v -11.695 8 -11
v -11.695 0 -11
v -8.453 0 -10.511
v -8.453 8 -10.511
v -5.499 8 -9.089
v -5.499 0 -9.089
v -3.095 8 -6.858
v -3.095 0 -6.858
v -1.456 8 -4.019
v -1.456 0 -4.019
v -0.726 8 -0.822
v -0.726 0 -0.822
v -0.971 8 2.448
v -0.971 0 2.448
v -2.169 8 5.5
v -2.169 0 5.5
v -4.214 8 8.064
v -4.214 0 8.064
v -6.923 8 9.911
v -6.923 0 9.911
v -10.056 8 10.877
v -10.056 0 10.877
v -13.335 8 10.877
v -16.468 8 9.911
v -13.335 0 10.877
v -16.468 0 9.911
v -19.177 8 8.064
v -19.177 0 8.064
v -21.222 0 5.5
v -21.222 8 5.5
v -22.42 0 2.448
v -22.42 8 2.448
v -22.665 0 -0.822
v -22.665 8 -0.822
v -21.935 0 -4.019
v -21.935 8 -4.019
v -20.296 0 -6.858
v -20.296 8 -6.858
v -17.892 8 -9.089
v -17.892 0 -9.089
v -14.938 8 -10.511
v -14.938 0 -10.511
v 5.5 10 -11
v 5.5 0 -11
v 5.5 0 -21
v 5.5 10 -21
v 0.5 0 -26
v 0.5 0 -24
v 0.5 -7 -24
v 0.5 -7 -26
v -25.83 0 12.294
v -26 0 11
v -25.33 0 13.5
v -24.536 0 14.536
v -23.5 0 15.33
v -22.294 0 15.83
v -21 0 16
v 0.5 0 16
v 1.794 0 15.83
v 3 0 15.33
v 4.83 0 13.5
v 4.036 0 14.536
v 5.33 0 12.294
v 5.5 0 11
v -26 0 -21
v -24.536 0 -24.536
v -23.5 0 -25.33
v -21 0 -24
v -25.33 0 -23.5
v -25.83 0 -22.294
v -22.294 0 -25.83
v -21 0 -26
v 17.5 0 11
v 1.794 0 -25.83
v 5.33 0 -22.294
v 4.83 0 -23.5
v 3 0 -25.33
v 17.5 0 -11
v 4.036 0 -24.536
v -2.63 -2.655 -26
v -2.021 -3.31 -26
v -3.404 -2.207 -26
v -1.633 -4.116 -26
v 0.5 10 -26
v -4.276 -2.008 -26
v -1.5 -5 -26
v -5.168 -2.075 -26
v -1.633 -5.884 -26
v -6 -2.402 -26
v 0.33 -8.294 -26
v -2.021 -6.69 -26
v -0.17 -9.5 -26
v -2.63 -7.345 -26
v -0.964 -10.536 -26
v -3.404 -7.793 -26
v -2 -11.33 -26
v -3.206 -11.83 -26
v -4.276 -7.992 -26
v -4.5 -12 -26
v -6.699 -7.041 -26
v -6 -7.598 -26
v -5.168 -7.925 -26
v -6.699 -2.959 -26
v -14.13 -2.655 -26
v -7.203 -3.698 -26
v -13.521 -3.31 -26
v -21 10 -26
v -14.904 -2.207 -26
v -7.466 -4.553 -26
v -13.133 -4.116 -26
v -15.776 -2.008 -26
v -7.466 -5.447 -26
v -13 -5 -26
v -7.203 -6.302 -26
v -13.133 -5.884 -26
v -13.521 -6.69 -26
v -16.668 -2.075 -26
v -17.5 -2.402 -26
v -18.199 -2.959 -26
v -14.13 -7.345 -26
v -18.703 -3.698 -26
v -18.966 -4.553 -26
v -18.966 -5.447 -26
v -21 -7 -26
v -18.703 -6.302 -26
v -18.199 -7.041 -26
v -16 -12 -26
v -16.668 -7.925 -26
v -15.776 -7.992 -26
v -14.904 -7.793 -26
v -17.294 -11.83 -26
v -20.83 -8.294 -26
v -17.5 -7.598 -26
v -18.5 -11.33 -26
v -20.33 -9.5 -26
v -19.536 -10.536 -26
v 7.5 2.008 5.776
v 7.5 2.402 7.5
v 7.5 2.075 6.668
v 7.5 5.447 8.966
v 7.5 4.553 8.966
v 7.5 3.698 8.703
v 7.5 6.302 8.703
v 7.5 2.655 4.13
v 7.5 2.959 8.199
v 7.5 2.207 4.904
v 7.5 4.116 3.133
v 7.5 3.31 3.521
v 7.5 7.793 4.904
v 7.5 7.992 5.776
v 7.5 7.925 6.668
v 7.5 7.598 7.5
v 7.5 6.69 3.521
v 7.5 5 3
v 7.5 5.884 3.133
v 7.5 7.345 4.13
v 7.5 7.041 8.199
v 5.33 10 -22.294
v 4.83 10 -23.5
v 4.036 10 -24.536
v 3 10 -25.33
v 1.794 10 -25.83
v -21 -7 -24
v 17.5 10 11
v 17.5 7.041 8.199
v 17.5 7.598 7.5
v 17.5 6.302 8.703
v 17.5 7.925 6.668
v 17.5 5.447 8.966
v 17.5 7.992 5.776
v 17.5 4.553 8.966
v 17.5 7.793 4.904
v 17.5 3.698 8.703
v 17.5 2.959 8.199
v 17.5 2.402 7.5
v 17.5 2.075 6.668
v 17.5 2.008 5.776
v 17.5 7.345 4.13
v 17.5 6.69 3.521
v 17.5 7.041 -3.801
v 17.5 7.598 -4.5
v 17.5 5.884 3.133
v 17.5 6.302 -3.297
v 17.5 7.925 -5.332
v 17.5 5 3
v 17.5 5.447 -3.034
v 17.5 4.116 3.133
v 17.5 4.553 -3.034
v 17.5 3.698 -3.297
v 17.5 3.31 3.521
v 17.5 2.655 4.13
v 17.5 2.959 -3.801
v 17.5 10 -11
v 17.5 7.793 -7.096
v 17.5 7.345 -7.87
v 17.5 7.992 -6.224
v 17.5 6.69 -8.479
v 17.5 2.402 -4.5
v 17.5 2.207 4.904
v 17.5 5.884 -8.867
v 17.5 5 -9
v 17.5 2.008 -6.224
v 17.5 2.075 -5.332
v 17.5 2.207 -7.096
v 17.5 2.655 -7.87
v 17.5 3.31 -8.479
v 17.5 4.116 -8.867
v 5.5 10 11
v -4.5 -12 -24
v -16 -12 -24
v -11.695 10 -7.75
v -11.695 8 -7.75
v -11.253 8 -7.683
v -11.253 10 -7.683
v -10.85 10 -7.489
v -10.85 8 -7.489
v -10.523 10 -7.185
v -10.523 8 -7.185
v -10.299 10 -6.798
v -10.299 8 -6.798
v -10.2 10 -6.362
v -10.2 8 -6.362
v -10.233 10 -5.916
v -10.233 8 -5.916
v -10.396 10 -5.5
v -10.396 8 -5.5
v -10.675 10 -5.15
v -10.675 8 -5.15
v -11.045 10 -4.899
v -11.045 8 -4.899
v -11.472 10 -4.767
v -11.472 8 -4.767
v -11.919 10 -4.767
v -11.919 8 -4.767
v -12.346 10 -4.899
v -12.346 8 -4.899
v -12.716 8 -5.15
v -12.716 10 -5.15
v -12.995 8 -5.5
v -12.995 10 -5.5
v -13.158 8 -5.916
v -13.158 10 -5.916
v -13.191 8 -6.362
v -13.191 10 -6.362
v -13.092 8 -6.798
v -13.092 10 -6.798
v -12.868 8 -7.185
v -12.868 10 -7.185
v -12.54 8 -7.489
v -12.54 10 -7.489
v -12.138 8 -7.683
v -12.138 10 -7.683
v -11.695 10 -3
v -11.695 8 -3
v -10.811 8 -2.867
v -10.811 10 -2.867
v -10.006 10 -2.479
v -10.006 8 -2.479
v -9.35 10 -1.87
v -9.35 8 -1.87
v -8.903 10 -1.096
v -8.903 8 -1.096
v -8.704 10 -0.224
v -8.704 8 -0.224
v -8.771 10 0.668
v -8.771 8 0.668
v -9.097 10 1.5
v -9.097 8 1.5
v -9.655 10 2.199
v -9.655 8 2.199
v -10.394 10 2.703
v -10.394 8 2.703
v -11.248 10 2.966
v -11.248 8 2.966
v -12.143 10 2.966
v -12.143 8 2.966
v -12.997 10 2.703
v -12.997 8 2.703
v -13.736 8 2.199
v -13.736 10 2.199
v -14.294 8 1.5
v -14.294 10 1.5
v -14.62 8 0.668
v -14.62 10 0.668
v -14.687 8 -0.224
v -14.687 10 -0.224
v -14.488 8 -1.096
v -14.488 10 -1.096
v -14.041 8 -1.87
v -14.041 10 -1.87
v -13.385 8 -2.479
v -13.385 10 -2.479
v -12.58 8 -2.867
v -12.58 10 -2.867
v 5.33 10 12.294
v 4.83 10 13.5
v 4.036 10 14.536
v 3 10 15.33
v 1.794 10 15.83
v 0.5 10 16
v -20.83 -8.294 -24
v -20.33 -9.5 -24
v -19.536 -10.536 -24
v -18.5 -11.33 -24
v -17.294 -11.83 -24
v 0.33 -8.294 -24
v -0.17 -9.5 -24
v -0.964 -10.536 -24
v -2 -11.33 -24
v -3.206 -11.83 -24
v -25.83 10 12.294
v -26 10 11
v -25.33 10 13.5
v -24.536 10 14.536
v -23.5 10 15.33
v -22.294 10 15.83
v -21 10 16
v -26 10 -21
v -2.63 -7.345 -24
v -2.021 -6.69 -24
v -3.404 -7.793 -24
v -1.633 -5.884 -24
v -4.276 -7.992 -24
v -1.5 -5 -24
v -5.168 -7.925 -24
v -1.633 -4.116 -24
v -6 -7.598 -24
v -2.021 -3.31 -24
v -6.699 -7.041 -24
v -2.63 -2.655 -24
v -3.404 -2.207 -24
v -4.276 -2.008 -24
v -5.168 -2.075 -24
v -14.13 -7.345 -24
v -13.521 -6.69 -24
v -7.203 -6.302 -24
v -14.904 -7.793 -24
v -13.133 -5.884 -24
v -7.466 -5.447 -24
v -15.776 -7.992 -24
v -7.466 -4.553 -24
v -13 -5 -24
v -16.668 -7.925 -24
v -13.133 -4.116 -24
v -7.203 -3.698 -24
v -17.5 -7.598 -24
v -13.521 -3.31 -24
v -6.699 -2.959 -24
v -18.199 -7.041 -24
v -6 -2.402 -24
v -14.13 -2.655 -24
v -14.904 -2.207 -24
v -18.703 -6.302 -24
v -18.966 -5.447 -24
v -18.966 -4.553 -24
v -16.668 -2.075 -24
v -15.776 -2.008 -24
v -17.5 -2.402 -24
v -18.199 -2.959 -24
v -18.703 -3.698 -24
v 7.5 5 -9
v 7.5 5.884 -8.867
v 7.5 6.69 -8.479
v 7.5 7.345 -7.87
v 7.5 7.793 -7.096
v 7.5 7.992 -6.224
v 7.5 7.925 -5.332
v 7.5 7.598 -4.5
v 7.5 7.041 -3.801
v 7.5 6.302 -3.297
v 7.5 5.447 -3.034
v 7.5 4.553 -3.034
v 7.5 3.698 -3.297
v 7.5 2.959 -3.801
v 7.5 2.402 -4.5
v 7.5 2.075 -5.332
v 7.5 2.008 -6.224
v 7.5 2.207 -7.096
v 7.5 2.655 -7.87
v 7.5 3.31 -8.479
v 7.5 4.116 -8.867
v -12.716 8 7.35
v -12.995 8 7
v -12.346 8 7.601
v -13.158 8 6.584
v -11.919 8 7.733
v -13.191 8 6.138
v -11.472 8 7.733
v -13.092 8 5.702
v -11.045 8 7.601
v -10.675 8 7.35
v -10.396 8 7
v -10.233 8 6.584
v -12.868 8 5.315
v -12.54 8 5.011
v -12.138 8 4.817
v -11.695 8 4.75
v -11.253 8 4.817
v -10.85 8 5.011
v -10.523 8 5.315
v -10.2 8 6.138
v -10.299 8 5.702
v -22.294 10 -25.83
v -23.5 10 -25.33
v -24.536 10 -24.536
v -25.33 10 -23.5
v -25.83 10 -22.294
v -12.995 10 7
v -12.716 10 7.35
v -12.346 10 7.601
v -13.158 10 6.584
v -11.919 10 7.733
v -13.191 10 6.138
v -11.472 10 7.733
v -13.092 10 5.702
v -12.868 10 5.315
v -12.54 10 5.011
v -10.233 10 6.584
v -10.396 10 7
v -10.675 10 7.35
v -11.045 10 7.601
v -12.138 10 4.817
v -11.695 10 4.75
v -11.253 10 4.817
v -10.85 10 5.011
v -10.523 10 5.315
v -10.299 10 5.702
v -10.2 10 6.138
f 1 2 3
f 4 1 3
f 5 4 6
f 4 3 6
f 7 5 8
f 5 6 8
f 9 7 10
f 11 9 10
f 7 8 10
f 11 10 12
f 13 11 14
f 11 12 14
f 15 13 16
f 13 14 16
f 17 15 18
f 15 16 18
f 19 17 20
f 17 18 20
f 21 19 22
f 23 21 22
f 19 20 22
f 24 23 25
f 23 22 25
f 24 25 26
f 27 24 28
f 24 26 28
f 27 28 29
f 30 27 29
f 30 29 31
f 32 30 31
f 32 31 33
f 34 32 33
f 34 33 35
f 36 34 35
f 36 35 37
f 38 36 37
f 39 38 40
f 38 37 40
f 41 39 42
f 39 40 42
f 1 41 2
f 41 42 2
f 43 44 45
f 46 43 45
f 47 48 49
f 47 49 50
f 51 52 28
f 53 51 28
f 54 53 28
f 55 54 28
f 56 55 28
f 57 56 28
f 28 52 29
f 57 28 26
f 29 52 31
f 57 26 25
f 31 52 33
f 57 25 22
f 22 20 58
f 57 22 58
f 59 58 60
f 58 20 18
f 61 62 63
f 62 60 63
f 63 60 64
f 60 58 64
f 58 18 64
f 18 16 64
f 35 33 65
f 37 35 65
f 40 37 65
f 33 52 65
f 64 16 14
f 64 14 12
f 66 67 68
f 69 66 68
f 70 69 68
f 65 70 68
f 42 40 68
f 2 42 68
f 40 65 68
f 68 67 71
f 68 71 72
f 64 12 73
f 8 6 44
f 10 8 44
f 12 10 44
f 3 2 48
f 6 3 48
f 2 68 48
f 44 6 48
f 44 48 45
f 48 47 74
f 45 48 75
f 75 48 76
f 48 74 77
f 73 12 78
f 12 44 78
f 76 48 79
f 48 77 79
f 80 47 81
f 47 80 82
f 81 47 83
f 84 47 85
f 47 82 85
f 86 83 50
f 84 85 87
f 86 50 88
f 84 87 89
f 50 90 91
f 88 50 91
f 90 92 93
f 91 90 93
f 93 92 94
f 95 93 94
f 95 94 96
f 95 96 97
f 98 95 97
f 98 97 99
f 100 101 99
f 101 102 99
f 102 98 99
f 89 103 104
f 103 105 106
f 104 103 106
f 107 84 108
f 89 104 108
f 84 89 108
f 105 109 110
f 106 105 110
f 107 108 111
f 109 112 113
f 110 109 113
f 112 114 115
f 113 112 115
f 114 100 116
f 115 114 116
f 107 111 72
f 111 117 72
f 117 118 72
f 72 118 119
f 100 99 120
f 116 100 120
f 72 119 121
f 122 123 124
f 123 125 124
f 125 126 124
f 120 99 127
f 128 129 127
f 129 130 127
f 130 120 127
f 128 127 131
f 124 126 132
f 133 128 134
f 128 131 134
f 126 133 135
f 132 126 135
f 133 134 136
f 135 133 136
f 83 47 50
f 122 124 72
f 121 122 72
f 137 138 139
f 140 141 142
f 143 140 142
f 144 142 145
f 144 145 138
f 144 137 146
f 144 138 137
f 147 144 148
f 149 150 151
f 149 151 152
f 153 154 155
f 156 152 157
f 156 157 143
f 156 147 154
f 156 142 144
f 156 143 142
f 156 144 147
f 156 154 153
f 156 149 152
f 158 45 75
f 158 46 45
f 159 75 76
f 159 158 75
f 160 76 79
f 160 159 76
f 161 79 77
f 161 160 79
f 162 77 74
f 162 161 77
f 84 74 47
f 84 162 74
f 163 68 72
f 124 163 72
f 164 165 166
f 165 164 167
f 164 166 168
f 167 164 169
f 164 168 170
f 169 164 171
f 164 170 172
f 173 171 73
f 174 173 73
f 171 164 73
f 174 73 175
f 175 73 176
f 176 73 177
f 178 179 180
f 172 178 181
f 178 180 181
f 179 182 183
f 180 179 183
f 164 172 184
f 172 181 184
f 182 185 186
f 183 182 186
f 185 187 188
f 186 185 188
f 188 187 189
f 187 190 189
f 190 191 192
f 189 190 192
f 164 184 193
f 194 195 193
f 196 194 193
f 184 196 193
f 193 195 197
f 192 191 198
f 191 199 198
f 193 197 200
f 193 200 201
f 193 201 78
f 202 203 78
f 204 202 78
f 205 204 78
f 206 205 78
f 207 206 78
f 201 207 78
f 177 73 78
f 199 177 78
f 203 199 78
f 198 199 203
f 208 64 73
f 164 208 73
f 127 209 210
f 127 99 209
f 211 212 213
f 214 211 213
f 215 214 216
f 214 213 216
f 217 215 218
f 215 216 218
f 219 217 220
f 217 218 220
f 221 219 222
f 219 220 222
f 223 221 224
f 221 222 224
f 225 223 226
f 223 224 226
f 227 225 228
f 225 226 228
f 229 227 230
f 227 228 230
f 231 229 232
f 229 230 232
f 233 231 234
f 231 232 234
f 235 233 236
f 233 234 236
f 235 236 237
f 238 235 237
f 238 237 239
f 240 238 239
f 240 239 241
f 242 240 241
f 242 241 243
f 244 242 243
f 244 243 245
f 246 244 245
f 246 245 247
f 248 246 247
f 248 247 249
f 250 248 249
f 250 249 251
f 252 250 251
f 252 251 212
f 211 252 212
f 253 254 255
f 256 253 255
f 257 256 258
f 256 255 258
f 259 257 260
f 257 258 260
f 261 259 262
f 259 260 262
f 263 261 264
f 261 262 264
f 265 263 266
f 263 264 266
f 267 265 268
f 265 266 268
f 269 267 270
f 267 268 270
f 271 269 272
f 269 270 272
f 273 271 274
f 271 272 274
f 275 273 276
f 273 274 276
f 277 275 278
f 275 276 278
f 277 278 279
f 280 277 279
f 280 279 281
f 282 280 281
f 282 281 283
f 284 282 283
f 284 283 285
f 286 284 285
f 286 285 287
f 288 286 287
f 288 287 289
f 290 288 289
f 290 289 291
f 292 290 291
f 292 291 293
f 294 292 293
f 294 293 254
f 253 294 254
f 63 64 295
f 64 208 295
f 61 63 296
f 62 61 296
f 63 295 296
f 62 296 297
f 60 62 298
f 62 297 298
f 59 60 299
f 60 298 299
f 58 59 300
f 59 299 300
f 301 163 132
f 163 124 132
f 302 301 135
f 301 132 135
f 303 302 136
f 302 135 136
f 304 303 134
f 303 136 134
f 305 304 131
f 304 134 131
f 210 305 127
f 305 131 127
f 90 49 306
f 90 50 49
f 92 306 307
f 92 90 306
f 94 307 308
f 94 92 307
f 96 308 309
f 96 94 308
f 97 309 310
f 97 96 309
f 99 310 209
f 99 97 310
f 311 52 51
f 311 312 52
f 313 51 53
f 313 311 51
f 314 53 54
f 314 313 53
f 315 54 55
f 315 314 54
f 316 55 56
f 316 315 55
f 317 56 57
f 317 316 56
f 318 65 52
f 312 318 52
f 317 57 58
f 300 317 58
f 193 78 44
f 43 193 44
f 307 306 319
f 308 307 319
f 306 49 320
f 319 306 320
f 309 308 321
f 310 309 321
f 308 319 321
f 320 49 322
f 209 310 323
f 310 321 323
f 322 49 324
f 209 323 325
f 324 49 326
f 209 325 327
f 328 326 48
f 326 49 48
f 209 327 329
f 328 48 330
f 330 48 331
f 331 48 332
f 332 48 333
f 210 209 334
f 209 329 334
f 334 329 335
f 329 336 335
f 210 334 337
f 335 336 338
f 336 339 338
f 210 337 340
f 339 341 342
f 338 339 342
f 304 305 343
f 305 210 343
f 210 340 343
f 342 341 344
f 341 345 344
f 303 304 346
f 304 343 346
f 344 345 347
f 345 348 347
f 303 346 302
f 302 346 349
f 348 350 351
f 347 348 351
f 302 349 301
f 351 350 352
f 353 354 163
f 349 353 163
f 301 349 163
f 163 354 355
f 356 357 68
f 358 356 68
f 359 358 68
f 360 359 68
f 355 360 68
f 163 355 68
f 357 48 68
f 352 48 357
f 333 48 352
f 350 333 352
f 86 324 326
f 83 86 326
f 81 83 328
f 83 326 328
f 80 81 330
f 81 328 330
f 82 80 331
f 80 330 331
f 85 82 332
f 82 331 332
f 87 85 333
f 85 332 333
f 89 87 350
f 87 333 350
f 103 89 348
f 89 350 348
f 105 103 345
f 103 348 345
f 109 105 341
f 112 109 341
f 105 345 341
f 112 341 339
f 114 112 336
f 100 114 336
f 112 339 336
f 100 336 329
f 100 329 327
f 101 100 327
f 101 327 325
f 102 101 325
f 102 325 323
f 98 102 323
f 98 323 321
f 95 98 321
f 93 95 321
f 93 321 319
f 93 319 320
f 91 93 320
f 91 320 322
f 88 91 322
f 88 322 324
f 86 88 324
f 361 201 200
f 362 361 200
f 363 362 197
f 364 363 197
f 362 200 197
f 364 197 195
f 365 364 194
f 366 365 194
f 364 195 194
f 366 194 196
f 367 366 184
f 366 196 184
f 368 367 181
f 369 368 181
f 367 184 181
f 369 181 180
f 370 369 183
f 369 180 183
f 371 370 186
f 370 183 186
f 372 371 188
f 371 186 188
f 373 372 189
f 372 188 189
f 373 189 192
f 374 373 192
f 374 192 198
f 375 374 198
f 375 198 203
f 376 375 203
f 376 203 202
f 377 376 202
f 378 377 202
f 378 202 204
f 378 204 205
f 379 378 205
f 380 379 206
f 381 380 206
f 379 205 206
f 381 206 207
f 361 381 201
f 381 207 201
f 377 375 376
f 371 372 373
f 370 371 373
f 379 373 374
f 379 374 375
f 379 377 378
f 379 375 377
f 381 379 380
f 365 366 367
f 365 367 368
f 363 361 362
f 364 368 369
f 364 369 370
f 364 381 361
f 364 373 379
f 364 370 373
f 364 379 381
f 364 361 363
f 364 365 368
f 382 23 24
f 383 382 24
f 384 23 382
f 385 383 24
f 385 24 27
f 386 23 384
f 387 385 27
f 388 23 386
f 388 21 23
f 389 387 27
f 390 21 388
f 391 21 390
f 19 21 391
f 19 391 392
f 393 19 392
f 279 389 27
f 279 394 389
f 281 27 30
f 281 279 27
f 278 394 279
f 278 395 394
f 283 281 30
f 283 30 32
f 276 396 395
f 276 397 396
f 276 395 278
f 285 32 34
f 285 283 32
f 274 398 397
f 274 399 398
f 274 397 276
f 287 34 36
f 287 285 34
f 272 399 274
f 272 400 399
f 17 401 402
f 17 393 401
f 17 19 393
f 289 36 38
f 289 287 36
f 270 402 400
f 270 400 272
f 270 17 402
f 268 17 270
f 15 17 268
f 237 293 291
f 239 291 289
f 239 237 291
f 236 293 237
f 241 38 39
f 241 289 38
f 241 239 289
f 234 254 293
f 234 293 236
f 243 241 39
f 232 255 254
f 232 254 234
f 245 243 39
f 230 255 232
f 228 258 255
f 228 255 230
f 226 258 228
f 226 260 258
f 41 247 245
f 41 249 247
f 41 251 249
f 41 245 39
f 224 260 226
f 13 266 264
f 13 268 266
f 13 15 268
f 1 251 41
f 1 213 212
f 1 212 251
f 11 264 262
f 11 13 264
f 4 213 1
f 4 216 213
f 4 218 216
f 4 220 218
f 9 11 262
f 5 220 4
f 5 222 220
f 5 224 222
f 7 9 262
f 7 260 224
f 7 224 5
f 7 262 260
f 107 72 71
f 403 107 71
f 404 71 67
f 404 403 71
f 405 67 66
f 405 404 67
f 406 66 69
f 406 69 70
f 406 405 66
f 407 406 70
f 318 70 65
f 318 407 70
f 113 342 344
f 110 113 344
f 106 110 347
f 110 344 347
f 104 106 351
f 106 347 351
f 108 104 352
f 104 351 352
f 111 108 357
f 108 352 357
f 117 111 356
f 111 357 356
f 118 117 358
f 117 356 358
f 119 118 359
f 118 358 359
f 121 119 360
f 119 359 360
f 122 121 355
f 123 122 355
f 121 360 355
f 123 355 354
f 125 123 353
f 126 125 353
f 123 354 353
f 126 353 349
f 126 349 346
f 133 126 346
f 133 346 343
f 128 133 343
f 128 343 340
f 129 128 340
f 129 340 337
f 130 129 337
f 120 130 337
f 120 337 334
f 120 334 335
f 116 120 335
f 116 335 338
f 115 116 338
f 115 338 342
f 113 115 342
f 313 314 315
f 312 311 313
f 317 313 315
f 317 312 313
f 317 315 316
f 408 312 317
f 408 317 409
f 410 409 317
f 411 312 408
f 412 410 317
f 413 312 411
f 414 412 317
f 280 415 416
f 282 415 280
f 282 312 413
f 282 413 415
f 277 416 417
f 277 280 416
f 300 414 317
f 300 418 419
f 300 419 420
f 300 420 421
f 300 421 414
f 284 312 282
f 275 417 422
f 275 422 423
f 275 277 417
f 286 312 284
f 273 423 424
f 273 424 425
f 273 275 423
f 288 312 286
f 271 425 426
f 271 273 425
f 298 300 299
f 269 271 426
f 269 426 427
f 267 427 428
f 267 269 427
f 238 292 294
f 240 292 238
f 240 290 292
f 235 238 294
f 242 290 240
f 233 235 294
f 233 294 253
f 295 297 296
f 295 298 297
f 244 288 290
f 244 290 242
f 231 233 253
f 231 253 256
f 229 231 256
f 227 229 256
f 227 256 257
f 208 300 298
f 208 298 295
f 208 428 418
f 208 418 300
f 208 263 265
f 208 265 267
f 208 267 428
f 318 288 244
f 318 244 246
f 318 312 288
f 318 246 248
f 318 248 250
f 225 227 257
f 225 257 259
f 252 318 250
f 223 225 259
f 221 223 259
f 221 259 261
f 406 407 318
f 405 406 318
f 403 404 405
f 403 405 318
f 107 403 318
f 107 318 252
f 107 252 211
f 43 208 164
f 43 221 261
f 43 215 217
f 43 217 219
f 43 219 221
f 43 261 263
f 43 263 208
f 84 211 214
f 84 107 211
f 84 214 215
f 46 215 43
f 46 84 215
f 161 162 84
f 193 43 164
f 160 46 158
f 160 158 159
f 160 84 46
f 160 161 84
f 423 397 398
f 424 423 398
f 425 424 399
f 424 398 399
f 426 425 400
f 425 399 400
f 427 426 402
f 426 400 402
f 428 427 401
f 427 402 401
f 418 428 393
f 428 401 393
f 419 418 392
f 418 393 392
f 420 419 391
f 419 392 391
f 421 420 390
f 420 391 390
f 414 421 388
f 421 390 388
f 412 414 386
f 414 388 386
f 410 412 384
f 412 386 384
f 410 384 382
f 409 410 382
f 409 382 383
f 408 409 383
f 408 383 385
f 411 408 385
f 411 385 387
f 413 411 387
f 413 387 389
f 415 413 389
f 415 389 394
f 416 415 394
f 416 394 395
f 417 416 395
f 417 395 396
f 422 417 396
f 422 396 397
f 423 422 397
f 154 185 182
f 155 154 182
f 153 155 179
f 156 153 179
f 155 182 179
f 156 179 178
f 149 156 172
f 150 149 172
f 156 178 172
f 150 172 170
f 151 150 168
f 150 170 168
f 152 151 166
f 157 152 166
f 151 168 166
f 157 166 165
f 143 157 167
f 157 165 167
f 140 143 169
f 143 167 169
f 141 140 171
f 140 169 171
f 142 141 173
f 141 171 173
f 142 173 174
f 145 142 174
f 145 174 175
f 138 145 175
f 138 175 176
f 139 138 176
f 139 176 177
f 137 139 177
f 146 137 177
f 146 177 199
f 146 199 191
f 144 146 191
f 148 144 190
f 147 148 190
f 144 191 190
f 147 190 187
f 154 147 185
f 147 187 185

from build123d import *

# Parameters (mm, degrees)
BOSS_EXTRUDE1_DEPTH = 10
SKETCH2_R           = 3
CUT_EXTRUDE1_DEPTH  = 10
SKETCH4_R           = 11
CUT_EXTRUDE3_DEPTH  = 8
SKETCH5_R           = 3
SKETCH5_R_2         = 1.5
CUT_EXTRUDE4_DEPTH  = 8
SKETCH7_W           = 21.5
SKETCH7_H           = 2
BOSS_EXTRUDE2_DEPTH = 12
FILLET1_R           = 5
SKETCH8_R           = 3
CUT_EXTRUDE5_DEPTH  = 20
FILLET2_R           = 5


with BuildPart() as part:
    # Sketch1 → Boss-Extrude1 (new body)
    with BuildSketch(Plane(origin=(0, 0, 0), x_dir=(1, 0, 0), z_dir=(0, 1, 0))):
        Polygon((5.5, 11), (5.5, 26), (-26, 26), (-26, -16), (5.5, -16), (5.5, -11), (17.5, -11), (17.5, 11), align=None)
    extrude(amount=BOSS_EXTRUDE1_DEPTH)

    # Sketch2 → Cut-Extrude1 (cut)
    with BuildSketch(Plane(origin=(17.5, 0, 0), x_dir=(0, 0, -1), z_dir=(1, 0, 0))):
        with Locations((-6, 5)):
            Circle(SKETCH2_R)
        with Locations((6, 5)):
            Circle(SKETCH2_R)
    extrude(amount=-CUT_EXTRUDE1_DEPTH, mode=Mode.SUBTRACT)

    # Sketch4 → Cut-Extrude3 (cut)
    with BuildSketch(Plane.XZ):
        with Locations(Location((-11.695464036, 0, 0), (0, 0, 270))):
            Circle(SKETCH4_R)
    extrude(amount=-CUT_EXTRUDE3_DEPTH, mode=Mode.SUBTRACT)

    # Sketch5 → Cut-Extrude4 (cut)
    with BuildSketch(Plane(origin=(0, 8, 0), x_dir=(-1, 0, 0), z_dir=(0, -1, 0))):
        with Locations(Location((11.695464036, 0, 0), (0, 0, 90))):
            Circle(SKETCH5_R)
        with Locations(Location((11.695464036, -6.25, 0), (0, 0, 90))):
            Circle(SKETCH5_R_2)
        with Locations(Location((11.695464036, 6.25, 0), (0, 0, 90))):
            Circle(SKETCH5_R_2)
    extrude(amount=-CUT_EXTRUDE4_DEPTH, mode=Mode.SUBTRACT)

    # Sketch7 → Boss-Extrude2 (add)
    with BuildSketch(Plane(origin=(0, 0, 0), x_dir=(-1, 0, 0), z_dir=(0, -1, 0))):
        with Locations((10.25, 25)):
            Rectangle(SKETCH7_W, SKETCH7_H)
    extrude(amount=BOSS_EXTRUDE2_DEPTH)

    # Fillet1
    fillet1_edges = [part.edges().sort_by_distance(p)[0] for p in [
        (-26, 5, -26),
        (5.5, 5, -26),
        (5.5, 5, 16),
        (-26, 5, 16),
    ]]
    fillet(fillet1_edges, radius=FILLET1_R - 0.0001)  # a hair under: the kernel refuses the full size

    # Sketch8 → Cut-Extrude5 (cut)
    with BuildSketch(Plane.XY.offset(-24)):
        with Locations((-16, -5)):
            Circle(SKETCH8_R)
        with Locations((-4.5, -5)):
            Circle(SKETCH8_R)
    extrude(amount=-CUT_EXTRUDE5_DEPTH, mode=Mode.SUBTRACT)

    # Fillet2
    fillet2_edges = [part.edges().sort_by_distance(p)[0] for p in [
        (0.5, -12, -25),
        (-21, -12, -25),
    ]]
    fillet(fillet2_edges, radius=FILLET2_R)


solid = part.part
